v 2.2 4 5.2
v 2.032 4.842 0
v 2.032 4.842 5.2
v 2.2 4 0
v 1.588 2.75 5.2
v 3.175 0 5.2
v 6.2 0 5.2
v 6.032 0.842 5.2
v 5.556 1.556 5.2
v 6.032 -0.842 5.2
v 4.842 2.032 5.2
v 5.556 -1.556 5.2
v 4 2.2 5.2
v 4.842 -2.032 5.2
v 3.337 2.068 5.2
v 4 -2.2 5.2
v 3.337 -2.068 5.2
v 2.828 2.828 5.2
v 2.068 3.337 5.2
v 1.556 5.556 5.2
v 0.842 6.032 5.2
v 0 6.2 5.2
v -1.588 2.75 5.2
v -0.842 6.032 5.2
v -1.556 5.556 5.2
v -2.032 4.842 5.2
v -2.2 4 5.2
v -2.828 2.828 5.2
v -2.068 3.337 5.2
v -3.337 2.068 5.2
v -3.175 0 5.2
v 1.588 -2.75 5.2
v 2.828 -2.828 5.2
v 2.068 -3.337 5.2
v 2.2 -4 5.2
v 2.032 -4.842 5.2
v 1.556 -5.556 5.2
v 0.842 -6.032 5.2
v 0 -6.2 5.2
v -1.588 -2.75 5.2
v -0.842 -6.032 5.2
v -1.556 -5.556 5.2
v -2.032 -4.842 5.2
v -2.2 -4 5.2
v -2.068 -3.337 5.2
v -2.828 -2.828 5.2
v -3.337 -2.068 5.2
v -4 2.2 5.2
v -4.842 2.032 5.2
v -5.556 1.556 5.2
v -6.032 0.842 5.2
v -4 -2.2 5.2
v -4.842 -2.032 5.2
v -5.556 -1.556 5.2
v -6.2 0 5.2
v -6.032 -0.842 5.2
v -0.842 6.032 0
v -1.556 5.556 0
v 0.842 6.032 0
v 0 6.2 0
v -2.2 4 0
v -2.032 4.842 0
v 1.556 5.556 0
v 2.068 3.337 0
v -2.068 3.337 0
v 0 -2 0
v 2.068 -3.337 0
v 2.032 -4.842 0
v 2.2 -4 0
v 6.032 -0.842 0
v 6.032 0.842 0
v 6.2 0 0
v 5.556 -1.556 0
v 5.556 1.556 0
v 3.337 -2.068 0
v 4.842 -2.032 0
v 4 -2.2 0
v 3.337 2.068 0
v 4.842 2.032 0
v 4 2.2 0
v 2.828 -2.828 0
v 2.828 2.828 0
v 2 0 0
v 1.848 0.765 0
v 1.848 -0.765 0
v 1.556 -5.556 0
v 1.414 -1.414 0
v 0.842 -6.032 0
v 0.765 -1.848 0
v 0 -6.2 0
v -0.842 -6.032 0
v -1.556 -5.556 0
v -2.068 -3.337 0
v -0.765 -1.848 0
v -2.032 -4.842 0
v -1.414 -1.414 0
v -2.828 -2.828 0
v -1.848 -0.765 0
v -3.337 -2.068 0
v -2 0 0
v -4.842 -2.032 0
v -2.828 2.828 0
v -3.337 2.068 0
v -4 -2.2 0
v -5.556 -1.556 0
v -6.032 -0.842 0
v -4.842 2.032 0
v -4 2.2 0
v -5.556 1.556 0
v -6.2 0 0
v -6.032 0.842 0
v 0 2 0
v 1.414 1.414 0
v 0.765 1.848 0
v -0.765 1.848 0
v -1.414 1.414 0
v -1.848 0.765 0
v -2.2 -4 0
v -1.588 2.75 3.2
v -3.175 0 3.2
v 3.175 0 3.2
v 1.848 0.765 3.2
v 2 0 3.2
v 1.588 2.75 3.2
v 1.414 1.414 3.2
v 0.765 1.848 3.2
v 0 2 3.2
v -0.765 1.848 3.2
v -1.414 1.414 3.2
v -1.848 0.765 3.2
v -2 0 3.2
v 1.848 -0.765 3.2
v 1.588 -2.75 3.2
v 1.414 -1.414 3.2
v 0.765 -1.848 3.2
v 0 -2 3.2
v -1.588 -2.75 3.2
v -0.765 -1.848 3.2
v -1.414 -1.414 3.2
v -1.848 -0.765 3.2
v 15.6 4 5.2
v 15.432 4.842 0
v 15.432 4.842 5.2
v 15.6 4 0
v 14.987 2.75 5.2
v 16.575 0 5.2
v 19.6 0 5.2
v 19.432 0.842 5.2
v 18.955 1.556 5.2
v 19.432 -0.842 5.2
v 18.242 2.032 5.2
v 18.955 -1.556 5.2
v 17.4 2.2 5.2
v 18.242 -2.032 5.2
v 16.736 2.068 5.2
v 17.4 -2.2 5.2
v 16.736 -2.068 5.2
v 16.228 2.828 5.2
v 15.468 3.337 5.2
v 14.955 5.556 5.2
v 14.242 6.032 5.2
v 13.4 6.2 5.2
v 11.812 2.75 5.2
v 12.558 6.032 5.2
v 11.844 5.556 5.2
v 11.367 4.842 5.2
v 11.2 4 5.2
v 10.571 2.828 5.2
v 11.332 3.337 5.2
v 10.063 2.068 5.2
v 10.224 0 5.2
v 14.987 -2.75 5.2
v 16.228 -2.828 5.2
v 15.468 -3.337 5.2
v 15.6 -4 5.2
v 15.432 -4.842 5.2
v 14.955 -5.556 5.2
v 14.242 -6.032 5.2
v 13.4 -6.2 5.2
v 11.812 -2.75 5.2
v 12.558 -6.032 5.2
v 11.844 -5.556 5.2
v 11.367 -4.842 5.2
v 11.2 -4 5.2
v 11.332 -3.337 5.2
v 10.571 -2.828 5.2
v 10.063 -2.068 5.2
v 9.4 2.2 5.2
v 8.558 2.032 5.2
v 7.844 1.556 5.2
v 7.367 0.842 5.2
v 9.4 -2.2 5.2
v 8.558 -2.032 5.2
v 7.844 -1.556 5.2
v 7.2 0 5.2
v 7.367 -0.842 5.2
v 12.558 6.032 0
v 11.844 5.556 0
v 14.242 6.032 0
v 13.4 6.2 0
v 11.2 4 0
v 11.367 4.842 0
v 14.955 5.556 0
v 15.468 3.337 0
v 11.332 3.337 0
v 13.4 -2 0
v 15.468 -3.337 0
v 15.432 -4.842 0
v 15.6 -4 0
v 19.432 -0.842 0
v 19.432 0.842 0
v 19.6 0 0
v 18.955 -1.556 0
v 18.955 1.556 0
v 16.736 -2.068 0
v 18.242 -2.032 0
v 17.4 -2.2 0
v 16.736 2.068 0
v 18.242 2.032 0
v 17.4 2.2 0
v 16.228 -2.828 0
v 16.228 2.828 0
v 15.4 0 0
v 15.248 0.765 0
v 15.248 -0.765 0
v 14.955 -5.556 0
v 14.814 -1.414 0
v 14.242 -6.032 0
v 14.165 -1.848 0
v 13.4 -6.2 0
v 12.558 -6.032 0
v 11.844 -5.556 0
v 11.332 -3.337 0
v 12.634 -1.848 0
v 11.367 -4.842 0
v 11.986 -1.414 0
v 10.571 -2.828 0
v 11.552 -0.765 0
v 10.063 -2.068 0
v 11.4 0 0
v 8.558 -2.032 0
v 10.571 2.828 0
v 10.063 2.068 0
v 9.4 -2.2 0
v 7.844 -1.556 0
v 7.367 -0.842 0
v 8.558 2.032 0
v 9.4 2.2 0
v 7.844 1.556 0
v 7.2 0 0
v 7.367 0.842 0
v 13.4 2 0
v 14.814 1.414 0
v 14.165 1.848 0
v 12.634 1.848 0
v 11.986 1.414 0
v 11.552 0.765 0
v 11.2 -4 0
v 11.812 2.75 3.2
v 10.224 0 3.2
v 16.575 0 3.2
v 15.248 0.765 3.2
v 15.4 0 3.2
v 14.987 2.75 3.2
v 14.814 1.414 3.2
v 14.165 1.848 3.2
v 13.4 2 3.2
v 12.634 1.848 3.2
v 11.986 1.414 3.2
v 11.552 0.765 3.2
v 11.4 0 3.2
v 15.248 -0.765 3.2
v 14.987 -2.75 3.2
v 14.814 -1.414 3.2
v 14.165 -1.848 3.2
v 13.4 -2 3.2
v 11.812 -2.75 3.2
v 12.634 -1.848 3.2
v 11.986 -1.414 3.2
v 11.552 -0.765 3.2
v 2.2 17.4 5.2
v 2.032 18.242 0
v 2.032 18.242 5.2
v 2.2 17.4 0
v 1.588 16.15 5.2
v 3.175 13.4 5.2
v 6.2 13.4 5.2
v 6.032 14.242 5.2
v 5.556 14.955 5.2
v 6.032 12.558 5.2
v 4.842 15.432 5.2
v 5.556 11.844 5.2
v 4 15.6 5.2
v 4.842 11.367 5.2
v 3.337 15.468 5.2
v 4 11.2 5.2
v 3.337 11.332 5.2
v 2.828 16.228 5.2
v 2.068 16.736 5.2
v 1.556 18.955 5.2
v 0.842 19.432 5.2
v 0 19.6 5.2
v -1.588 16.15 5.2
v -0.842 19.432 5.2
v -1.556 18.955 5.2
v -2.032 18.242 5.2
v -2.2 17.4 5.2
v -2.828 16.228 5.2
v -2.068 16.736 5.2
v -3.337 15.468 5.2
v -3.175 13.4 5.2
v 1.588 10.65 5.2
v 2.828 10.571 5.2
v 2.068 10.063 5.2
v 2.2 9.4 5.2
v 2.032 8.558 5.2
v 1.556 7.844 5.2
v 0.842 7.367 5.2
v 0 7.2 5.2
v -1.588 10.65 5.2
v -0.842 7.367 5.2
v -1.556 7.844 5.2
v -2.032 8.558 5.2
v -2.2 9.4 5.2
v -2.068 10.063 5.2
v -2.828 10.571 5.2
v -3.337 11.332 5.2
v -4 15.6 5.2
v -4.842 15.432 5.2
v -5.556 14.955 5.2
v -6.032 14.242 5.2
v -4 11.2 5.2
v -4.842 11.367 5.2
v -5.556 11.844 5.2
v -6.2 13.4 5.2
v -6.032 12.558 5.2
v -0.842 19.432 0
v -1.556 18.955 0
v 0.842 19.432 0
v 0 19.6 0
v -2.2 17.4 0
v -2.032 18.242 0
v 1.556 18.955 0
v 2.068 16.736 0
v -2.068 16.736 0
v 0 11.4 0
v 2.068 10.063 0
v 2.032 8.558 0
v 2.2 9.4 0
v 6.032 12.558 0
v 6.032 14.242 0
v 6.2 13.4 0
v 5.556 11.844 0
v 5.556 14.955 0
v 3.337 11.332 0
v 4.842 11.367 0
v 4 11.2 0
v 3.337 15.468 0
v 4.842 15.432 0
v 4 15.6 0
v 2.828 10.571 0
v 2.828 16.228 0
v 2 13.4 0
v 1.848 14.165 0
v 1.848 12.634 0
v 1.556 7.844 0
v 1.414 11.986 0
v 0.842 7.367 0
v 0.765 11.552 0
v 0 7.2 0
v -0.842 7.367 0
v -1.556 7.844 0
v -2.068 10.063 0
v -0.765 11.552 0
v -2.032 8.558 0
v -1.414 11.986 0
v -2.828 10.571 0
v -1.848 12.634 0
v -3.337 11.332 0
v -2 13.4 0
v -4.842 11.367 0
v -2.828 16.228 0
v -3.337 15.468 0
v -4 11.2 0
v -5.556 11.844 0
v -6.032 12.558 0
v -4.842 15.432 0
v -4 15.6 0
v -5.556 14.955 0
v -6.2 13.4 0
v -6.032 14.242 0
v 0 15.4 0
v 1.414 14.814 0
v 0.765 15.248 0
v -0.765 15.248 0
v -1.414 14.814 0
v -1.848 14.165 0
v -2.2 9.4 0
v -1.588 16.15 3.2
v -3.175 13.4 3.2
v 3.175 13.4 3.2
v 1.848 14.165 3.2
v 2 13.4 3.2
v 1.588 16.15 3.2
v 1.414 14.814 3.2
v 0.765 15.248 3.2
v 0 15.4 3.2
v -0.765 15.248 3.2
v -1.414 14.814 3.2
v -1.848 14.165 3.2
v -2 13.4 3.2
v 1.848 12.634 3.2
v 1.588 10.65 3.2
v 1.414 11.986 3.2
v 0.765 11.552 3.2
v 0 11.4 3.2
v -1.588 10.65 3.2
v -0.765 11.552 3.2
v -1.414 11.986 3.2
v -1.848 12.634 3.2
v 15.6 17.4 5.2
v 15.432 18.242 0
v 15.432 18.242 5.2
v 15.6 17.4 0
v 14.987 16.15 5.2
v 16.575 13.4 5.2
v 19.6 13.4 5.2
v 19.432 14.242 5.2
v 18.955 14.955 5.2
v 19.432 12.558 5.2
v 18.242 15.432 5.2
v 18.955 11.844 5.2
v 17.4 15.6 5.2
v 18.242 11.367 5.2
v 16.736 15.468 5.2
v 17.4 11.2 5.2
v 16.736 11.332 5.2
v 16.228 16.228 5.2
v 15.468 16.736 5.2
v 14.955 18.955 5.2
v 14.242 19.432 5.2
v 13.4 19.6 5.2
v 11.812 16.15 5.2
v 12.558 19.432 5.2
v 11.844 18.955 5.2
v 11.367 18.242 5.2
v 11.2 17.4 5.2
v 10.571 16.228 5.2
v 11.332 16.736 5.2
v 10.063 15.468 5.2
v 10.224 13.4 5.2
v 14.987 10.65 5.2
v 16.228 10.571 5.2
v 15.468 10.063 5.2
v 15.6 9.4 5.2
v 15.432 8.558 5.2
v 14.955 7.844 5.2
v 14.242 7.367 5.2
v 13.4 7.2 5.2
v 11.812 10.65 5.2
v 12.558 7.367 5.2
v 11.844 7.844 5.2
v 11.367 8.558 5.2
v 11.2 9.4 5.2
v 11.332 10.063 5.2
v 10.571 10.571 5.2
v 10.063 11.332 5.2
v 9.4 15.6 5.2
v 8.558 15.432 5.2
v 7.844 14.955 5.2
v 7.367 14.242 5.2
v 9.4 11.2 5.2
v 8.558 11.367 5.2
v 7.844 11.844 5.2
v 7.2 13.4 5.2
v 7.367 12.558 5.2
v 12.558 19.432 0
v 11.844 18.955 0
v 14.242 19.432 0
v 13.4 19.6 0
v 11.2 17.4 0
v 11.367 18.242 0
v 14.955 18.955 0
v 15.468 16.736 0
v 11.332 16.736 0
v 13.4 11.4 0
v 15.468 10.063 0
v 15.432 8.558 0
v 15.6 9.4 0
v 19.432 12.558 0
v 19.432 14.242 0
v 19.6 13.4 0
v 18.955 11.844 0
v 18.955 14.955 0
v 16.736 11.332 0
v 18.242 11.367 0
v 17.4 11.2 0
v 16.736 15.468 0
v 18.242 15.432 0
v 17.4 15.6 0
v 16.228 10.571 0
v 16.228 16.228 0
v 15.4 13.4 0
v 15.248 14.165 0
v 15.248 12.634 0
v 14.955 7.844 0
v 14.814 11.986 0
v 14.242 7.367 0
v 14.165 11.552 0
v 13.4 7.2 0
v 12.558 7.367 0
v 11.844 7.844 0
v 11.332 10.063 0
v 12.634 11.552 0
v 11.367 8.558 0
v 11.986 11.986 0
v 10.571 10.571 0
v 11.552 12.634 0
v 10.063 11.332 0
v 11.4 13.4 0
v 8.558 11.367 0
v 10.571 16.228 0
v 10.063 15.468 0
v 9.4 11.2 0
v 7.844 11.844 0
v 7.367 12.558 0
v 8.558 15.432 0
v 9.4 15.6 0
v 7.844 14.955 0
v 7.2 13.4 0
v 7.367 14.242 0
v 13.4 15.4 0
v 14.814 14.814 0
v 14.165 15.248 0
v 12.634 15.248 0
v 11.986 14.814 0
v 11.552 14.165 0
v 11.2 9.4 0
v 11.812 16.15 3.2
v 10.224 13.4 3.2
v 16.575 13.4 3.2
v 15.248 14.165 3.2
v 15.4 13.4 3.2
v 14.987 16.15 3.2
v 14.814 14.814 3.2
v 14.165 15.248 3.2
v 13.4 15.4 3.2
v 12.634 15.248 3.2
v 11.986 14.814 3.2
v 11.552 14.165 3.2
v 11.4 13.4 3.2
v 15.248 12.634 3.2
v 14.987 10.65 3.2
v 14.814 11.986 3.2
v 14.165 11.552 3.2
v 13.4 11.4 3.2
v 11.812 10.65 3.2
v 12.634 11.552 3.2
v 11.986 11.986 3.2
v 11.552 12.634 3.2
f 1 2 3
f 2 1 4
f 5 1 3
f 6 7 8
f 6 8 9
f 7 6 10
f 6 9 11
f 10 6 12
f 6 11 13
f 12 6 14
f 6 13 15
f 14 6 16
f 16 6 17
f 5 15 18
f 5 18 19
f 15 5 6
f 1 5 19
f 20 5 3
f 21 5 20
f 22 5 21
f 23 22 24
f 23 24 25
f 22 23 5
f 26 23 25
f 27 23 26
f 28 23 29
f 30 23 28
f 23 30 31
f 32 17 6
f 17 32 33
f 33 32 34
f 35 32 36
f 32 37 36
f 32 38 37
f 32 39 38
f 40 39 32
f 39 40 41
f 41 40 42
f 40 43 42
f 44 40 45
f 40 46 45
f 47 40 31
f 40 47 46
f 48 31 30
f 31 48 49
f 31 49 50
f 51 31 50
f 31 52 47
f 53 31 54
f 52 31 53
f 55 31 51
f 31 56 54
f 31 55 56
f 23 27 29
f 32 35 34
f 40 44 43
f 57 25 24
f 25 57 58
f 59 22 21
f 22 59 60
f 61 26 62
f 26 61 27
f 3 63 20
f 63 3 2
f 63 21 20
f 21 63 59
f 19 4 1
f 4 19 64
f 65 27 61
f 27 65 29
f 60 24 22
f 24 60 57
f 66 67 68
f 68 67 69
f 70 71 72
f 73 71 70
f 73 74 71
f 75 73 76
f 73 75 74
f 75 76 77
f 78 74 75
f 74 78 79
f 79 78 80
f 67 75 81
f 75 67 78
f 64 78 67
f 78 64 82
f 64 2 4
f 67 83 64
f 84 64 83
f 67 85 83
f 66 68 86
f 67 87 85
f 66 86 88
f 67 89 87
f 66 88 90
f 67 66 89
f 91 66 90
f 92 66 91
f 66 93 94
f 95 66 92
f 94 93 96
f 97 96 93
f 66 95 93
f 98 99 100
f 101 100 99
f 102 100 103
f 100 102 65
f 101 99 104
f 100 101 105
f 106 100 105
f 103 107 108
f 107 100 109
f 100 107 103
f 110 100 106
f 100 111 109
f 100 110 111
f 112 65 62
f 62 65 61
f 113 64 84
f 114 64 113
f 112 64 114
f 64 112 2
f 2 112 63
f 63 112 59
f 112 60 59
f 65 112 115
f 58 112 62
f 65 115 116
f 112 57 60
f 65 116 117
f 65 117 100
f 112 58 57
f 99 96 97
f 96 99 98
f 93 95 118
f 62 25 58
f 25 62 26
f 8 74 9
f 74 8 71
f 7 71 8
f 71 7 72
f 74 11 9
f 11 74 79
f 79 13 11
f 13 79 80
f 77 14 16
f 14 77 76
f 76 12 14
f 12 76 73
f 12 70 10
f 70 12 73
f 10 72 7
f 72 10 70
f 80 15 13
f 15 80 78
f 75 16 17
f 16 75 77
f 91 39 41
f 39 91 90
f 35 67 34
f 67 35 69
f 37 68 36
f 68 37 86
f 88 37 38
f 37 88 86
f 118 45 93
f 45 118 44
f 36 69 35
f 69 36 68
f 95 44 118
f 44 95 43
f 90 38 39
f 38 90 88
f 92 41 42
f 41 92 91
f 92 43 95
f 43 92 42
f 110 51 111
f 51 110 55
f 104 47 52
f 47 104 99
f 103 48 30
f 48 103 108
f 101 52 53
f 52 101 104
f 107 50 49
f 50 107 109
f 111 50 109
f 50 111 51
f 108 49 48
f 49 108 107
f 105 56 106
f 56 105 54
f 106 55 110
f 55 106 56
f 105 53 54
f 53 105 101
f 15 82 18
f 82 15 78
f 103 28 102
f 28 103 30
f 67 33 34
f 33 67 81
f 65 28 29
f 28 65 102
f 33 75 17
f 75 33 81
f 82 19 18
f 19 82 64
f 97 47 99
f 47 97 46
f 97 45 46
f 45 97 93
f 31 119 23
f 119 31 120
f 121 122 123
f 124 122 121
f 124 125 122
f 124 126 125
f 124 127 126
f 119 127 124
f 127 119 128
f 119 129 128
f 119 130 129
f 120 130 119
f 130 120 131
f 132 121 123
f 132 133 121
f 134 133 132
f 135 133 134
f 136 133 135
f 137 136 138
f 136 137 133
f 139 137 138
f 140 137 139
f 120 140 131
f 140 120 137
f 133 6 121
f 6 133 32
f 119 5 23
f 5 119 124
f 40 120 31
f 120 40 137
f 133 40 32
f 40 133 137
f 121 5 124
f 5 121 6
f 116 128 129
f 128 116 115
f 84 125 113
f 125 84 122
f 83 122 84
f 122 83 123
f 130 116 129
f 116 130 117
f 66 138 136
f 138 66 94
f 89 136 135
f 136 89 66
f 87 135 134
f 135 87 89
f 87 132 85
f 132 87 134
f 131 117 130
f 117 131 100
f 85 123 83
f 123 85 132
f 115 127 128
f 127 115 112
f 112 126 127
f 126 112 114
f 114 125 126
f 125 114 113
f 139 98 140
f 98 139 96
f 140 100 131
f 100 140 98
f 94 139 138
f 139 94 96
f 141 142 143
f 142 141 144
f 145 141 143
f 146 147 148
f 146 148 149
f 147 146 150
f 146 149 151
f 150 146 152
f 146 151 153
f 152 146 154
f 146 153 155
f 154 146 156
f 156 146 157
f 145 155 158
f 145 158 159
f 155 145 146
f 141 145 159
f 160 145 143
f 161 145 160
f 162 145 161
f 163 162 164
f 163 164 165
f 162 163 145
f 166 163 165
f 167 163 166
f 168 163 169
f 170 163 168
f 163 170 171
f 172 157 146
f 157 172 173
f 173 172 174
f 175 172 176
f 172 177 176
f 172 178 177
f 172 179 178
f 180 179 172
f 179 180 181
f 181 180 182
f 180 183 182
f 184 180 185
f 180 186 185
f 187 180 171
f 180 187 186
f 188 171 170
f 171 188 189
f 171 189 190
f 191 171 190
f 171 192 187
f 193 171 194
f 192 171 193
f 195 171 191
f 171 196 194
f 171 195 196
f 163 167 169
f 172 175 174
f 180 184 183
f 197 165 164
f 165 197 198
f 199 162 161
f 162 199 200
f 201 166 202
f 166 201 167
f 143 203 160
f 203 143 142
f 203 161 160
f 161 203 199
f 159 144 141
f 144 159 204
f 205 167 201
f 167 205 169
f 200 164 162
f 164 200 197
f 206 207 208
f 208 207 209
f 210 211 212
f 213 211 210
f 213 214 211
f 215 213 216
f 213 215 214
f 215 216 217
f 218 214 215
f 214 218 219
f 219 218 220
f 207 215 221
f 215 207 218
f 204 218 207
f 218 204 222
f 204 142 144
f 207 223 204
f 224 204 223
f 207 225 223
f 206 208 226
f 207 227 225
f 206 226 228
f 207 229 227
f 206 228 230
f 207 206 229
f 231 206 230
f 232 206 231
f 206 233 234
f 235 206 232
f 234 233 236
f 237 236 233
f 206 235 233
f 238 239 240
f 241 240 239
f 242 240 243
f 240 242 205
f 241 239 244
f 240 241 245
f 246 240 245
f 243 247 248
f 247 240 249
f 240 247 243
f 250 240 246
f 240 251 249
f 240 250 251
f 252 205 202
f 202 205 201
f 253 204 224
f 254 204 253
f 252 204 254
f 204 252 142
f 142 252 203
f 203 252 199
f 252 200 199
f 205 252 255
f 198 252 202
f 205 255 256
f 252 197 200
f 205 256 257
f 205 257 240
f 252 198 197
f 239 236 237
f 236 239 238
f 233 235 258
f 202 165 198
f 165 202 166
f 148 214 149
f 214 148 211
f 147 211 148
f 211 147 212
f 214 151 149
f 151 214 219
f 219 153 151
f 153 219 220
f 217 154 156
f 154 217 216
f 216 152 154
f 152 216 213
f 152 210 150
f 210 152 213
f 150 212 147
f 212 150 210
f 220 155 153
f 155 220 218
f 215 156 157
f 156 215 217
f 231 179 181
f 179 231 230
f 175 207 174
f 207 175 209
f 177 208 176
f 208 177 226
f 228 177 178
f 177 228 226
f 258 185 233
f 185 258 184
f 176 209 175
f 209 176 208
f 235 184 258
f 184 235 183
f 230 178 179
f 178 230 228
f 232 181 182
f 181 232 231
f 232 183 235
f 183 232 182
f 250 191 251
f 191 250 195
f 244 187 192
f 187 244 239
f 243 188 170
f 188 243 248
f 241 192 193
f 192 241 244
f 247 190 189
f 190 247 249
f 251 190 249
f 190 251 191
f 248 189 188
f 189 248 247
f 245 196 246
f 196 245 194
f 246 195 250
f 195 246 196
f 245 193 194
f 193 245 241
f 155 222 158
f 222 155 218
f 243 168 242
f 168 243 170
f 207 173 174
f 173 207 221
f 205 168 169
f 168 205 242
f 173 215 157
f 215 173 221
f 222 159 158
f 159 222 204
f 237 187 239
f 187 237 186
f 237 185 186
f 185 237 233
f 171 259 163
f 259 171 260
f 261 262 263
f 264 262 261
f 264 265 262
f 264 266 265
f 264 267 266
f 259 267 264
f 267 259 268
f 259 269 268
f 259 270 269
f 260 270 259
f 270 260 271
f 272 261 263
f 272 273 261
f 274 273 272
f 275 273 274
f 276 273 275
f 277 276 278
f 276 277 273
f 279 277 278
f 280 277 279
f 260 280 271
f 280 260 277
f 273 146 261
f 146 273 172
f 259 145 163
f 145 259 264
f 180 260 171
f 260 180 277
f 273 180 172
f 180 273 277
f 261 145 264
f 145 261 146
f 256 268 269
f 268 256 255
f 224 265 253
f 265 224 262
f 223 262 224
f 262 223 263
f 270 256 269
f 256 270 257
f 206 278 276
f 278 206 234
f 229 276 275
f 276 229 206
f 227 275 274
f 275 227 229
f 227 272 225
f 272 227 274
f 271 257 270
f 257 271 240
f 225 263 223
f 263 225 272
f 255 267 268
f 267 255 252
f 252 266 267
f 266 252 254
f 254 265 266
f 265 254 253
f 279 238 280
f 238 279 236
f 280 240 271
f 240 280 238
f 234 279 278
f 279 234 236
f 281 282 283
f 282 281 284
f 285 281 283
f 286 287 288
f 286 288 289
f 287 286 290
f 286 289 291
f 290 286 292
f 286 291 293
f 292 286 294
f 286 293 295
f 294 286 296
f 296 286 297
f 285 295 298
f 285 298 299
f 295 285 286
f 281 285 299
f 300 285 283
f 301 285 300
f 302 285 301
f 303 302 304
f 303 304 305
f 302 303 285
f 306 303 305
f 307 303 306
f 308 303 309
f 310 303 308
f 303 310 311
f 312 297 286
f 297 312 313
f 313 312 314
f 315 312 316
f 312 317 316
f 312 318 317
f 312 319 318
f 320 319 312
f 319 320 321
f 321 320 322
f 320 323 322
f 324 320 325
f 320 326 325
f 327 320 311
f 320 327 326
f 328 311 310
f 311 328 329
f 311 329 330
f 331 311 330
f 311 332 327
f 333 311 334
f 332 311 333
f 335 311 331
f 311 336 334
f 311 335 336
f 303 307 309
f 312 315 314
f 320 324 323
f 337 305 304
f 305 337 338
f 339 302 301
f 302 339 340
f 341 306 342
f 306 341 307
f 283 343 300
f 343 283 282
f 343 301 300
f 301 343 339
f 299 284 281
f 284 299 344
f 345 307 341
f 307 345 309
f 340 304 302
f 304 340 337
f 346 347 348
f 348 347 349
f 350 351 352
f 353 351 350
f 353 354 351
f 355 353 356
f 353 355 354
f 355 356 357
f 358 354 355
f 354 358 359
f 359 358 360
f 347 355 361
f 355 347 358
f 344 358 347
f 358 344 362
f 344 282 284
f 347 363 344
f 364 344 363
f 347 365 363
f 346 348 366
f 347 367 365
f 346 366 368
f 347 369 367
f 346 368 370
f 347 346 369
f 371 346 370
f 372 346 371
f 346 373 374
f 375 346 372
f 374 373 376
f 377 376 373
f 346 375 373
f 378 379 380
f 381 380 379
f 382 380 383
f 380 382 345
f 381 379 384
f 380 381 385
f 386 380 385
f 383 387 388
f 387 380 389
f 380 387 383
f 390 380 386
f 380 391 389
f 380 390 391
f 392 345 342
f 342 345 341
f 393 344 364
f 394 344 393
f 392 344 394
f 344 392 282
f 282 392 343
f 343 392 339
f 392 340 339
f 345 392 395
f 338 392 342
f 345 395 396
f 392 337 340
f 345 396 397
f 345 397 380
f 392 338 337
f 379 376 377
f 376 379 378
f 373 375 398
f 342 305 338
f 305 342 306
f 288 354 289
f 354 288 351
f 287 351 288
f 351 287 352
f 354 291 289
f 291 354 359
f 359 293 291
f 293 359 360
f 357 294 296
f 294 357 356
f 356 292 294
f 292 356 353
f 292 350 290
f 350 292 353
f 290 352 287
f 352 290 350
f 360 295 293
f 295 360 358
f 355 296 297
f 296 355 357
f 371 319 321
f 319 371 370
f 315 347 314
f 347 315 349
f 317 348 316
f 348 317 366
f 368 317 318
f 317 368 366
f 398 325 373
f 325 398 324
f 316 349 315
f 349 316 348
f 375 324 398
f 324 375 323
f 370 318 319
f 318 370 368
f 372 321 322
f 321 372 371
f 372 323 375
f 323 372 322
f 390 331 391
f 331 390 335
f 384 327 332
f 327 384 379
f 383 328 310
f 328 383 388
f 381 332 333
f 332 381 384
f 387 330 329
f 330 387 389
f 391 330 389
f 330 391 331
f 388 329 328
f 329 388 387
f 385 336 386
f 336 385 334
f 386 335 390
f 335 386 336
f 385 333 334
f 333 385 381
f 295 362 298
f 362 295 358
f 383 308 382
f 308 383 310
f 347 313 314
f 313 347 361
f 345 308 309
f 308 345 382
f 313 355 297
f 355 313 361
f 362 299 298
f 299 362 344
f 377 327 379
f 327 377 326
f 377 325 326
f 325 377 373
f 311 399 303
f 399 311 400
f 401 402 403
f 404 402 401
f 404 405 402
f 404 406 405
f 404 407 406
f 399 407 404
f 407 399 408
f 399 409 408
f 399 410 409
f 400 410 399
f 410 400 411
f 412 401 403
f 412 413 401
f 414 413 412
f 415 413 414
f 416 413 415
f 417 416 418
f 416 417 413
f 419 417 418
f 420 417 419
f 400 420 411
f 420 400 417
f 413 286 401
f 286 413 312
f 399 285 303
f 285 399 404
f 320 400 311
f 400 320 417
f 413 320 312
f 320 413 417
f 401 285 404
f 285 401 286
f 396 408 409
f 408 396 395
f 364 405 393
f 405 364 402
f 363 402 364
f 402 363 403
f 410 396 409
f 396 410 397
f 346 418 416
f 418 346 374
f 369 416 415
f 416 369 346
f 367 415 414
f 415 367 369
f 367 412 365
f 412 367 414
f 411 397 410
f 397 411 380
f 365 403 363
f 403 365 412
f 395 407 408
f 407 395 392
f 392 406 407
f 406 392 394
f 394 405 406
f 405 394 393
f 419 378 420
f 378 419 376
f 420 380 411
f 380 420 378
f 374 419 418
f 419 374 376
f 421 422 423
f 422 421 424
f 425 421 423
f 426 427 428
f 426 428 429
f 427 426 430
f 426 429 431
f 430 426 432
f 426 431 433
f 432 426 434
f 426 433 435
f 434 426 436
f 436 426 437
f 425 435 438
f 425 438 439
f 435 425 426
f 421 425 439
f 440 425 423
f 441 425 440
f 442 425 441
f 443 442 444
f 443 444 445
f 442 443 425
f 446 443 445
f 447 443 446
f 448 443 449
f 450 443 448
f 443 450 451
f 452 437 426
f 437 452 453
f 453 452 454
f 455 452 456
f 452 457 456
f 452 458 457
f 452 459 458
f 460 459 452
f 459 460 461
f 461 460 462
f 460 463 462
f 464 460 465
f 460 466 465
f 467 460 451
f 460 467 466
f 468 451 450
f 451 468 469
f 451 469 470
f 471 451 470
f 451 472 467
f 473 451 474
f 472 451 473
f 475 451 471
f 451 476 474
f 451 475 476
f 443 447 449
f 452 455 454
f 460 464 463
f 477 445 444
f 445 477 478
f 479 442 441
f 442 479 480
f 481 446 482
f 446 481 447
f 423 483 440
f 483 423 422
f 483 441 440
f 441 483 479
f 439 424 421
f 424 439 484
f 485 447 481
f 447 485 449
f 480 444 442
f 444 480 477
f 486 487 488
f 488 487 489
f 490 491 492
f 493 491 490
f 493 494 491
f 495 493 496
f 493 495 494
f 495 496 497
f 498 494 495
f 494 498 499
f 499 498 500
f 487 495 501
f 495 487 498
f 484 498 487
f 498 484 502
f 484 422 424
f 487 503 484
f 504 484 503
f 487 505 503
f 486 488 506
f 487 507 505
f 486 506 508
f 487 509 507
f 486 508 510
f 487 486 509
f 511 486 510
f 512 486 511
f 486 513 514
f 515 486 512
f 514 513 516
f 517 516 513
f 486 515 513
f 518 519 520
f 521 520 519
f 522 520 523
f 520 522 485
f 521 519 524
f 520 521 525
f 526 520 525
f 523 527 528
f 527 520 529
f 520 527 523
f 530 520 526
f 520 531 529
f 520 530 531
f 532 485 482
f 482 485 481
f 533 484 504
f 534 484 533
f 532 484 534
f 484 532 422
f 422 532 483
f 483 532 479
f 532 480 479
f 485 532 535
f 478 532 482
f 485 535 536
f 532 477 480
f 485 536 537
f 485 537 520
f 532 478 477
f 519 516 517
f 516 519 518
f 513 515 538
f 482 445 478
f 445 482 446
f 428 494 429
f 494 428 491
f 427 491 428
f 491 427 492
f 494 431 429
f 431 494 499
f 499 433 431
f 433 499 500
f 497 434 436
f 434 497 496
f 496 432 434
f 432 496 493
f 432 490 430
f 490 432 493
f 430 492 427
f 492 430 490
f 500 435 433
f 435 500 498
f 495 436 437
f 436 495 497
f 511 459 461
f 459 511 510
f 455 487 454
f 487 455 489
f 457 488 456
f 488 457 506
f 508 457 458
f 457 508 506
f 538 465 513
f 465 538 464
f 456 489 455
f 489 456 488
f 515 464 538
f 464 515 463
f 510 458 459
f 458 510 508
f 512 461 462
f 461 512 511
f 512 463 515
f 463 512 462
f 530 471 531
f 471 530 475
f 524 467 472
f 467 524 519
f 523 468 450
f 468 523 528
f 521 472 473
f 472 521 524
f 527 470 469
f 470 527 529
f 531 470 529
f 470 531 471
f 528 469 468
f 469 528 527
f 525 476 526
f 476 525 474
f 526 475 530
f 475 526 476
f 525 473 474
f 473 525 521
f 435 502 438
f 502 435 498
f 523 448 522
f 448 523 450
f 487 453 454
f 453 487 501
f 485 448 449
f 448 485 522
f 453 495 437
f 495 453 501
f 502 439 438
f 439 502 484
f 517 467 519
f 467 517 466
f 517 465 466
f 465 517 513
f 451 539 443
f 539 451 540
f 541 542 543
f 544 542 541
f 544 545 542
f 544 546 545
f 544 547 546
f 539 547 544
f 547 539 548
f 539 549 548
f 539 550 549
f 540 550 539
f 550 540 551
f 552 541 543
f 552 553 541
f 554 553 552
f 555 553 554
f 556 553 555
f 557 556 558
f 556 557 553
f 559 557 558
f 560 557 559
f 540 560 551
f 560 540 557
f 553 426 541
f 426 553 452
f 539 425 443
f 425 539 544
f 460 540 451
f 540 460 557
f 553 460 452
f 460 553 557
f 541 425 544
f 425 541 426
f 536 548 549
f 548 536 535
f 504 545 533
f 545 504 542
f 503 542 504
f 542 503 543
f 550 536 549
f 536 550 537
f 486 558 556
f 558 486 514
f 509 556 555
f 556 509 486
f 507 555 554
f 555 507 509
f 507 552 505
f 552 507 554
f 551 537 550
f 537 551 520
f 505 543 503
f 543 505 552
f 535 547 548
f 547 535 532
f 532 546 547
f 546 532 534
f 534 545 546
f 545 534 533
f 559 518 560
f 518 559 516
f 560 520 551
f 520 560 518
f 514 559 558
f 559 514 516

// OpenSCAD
// Thumbwheel for nuts, suitable for M3 nyloc and M3 standard nuts
// by Andy Gock
//
// With rounded thingies on the outside for gripping
//
// The nut recess should be a tight fit and will need a press
// vice or a hammer to fit the nut inside. A bit of superglue
// is also a good idea prior to fitting.

pi = 3.1427*1;

// To change between M3 standard nut or nyloc, we need to change the variables:
// knob_height, nut_height

// use 4.00 for standard nut, 5.20 for full nyloc
knob_height = 5.2; 
knob_diameter = 8.0;
knurl_count = 4;
knurl_diameter = 0.7 * knob_diameter * pi / knurl_count;
nut_width_flats = 5.50;

// set to 1 to make an array of 4 thumbwheels, set to 0 for just one thumbwheel
make_quad_array = 1; 

// This height determines the recess for the nut to press into
// Make this a little less than the actual nut height as we want
// a little bit of nut sticking out
// Note: 2.44mm is actual nut height for M3 half nut, 3.85mm is actual nut height for M3 nyloc
// use 2.00 for standard nut, use 3.20 for nyloc
nut_height = 2.00; 
// use 4.0 for a M3 screw thread
hole_diameter = 4.0; 

// Don't change, this is for the rendering of difference() to look nice
diff_fudge = 0.1*1;

$fn = 16*1;

// one nut
translate([0,0,0])
	thumbwheel();

if (make_quad_array == 1) {
	// make array of nuts (not including first one)
	
	translate([knob_diameter+knurl_diameter+1,0,0])
		thumbwheel();

	translate([0,knob_diameter+knurl_diameter+1,0])
		thumbwheel();
		
	translate([knob_diameter+knurl_diameter+1,knob_diameter+knurl_diameter+1,0])
		thumbwheel();

}

module thumbwheel(knob_height=knob_height, knob_diameter=knob_diameter, knurl_count=knurl_count, nut_width_flats=nut_width_flats, nut_height=nut_height, hole_diameter=hole_diameter) {

	difference() {

		union() {

			// make main cylinder
			cylinder(h=knob_height, r1=knob_diameter/2, r2=knob_diameter/2);

			// make other cylinders
			for (i = [0:(knurl_count-1)])
			{
				translate([knob_diameter/2 * sin(i*360/knurl_count), knob_diameter/2 * cos(i*360/knurl_count),0])
					cylinder(h=knob_height, r1=knurl_diameter/2, r2=knurl_diameter/2);
			}

		}

		// cut out for the nut hole
		translate([0,0,knob_height-nut_height])
			hexagon_prism( nut_height+diff_fudge, (nut_width_flats/2) / sin(60));

		// center hole for the screw to go through
		translate([0,0,-diff_fudge])
			cylinder(h = knob_height*2, r1=hole_diameter/2, r2=hole_diameter/2);

	}

}

module hexagon_prism(height,radius)
{
  linear_extrude(height=height) circle(r=radius,$fn=6);
}
